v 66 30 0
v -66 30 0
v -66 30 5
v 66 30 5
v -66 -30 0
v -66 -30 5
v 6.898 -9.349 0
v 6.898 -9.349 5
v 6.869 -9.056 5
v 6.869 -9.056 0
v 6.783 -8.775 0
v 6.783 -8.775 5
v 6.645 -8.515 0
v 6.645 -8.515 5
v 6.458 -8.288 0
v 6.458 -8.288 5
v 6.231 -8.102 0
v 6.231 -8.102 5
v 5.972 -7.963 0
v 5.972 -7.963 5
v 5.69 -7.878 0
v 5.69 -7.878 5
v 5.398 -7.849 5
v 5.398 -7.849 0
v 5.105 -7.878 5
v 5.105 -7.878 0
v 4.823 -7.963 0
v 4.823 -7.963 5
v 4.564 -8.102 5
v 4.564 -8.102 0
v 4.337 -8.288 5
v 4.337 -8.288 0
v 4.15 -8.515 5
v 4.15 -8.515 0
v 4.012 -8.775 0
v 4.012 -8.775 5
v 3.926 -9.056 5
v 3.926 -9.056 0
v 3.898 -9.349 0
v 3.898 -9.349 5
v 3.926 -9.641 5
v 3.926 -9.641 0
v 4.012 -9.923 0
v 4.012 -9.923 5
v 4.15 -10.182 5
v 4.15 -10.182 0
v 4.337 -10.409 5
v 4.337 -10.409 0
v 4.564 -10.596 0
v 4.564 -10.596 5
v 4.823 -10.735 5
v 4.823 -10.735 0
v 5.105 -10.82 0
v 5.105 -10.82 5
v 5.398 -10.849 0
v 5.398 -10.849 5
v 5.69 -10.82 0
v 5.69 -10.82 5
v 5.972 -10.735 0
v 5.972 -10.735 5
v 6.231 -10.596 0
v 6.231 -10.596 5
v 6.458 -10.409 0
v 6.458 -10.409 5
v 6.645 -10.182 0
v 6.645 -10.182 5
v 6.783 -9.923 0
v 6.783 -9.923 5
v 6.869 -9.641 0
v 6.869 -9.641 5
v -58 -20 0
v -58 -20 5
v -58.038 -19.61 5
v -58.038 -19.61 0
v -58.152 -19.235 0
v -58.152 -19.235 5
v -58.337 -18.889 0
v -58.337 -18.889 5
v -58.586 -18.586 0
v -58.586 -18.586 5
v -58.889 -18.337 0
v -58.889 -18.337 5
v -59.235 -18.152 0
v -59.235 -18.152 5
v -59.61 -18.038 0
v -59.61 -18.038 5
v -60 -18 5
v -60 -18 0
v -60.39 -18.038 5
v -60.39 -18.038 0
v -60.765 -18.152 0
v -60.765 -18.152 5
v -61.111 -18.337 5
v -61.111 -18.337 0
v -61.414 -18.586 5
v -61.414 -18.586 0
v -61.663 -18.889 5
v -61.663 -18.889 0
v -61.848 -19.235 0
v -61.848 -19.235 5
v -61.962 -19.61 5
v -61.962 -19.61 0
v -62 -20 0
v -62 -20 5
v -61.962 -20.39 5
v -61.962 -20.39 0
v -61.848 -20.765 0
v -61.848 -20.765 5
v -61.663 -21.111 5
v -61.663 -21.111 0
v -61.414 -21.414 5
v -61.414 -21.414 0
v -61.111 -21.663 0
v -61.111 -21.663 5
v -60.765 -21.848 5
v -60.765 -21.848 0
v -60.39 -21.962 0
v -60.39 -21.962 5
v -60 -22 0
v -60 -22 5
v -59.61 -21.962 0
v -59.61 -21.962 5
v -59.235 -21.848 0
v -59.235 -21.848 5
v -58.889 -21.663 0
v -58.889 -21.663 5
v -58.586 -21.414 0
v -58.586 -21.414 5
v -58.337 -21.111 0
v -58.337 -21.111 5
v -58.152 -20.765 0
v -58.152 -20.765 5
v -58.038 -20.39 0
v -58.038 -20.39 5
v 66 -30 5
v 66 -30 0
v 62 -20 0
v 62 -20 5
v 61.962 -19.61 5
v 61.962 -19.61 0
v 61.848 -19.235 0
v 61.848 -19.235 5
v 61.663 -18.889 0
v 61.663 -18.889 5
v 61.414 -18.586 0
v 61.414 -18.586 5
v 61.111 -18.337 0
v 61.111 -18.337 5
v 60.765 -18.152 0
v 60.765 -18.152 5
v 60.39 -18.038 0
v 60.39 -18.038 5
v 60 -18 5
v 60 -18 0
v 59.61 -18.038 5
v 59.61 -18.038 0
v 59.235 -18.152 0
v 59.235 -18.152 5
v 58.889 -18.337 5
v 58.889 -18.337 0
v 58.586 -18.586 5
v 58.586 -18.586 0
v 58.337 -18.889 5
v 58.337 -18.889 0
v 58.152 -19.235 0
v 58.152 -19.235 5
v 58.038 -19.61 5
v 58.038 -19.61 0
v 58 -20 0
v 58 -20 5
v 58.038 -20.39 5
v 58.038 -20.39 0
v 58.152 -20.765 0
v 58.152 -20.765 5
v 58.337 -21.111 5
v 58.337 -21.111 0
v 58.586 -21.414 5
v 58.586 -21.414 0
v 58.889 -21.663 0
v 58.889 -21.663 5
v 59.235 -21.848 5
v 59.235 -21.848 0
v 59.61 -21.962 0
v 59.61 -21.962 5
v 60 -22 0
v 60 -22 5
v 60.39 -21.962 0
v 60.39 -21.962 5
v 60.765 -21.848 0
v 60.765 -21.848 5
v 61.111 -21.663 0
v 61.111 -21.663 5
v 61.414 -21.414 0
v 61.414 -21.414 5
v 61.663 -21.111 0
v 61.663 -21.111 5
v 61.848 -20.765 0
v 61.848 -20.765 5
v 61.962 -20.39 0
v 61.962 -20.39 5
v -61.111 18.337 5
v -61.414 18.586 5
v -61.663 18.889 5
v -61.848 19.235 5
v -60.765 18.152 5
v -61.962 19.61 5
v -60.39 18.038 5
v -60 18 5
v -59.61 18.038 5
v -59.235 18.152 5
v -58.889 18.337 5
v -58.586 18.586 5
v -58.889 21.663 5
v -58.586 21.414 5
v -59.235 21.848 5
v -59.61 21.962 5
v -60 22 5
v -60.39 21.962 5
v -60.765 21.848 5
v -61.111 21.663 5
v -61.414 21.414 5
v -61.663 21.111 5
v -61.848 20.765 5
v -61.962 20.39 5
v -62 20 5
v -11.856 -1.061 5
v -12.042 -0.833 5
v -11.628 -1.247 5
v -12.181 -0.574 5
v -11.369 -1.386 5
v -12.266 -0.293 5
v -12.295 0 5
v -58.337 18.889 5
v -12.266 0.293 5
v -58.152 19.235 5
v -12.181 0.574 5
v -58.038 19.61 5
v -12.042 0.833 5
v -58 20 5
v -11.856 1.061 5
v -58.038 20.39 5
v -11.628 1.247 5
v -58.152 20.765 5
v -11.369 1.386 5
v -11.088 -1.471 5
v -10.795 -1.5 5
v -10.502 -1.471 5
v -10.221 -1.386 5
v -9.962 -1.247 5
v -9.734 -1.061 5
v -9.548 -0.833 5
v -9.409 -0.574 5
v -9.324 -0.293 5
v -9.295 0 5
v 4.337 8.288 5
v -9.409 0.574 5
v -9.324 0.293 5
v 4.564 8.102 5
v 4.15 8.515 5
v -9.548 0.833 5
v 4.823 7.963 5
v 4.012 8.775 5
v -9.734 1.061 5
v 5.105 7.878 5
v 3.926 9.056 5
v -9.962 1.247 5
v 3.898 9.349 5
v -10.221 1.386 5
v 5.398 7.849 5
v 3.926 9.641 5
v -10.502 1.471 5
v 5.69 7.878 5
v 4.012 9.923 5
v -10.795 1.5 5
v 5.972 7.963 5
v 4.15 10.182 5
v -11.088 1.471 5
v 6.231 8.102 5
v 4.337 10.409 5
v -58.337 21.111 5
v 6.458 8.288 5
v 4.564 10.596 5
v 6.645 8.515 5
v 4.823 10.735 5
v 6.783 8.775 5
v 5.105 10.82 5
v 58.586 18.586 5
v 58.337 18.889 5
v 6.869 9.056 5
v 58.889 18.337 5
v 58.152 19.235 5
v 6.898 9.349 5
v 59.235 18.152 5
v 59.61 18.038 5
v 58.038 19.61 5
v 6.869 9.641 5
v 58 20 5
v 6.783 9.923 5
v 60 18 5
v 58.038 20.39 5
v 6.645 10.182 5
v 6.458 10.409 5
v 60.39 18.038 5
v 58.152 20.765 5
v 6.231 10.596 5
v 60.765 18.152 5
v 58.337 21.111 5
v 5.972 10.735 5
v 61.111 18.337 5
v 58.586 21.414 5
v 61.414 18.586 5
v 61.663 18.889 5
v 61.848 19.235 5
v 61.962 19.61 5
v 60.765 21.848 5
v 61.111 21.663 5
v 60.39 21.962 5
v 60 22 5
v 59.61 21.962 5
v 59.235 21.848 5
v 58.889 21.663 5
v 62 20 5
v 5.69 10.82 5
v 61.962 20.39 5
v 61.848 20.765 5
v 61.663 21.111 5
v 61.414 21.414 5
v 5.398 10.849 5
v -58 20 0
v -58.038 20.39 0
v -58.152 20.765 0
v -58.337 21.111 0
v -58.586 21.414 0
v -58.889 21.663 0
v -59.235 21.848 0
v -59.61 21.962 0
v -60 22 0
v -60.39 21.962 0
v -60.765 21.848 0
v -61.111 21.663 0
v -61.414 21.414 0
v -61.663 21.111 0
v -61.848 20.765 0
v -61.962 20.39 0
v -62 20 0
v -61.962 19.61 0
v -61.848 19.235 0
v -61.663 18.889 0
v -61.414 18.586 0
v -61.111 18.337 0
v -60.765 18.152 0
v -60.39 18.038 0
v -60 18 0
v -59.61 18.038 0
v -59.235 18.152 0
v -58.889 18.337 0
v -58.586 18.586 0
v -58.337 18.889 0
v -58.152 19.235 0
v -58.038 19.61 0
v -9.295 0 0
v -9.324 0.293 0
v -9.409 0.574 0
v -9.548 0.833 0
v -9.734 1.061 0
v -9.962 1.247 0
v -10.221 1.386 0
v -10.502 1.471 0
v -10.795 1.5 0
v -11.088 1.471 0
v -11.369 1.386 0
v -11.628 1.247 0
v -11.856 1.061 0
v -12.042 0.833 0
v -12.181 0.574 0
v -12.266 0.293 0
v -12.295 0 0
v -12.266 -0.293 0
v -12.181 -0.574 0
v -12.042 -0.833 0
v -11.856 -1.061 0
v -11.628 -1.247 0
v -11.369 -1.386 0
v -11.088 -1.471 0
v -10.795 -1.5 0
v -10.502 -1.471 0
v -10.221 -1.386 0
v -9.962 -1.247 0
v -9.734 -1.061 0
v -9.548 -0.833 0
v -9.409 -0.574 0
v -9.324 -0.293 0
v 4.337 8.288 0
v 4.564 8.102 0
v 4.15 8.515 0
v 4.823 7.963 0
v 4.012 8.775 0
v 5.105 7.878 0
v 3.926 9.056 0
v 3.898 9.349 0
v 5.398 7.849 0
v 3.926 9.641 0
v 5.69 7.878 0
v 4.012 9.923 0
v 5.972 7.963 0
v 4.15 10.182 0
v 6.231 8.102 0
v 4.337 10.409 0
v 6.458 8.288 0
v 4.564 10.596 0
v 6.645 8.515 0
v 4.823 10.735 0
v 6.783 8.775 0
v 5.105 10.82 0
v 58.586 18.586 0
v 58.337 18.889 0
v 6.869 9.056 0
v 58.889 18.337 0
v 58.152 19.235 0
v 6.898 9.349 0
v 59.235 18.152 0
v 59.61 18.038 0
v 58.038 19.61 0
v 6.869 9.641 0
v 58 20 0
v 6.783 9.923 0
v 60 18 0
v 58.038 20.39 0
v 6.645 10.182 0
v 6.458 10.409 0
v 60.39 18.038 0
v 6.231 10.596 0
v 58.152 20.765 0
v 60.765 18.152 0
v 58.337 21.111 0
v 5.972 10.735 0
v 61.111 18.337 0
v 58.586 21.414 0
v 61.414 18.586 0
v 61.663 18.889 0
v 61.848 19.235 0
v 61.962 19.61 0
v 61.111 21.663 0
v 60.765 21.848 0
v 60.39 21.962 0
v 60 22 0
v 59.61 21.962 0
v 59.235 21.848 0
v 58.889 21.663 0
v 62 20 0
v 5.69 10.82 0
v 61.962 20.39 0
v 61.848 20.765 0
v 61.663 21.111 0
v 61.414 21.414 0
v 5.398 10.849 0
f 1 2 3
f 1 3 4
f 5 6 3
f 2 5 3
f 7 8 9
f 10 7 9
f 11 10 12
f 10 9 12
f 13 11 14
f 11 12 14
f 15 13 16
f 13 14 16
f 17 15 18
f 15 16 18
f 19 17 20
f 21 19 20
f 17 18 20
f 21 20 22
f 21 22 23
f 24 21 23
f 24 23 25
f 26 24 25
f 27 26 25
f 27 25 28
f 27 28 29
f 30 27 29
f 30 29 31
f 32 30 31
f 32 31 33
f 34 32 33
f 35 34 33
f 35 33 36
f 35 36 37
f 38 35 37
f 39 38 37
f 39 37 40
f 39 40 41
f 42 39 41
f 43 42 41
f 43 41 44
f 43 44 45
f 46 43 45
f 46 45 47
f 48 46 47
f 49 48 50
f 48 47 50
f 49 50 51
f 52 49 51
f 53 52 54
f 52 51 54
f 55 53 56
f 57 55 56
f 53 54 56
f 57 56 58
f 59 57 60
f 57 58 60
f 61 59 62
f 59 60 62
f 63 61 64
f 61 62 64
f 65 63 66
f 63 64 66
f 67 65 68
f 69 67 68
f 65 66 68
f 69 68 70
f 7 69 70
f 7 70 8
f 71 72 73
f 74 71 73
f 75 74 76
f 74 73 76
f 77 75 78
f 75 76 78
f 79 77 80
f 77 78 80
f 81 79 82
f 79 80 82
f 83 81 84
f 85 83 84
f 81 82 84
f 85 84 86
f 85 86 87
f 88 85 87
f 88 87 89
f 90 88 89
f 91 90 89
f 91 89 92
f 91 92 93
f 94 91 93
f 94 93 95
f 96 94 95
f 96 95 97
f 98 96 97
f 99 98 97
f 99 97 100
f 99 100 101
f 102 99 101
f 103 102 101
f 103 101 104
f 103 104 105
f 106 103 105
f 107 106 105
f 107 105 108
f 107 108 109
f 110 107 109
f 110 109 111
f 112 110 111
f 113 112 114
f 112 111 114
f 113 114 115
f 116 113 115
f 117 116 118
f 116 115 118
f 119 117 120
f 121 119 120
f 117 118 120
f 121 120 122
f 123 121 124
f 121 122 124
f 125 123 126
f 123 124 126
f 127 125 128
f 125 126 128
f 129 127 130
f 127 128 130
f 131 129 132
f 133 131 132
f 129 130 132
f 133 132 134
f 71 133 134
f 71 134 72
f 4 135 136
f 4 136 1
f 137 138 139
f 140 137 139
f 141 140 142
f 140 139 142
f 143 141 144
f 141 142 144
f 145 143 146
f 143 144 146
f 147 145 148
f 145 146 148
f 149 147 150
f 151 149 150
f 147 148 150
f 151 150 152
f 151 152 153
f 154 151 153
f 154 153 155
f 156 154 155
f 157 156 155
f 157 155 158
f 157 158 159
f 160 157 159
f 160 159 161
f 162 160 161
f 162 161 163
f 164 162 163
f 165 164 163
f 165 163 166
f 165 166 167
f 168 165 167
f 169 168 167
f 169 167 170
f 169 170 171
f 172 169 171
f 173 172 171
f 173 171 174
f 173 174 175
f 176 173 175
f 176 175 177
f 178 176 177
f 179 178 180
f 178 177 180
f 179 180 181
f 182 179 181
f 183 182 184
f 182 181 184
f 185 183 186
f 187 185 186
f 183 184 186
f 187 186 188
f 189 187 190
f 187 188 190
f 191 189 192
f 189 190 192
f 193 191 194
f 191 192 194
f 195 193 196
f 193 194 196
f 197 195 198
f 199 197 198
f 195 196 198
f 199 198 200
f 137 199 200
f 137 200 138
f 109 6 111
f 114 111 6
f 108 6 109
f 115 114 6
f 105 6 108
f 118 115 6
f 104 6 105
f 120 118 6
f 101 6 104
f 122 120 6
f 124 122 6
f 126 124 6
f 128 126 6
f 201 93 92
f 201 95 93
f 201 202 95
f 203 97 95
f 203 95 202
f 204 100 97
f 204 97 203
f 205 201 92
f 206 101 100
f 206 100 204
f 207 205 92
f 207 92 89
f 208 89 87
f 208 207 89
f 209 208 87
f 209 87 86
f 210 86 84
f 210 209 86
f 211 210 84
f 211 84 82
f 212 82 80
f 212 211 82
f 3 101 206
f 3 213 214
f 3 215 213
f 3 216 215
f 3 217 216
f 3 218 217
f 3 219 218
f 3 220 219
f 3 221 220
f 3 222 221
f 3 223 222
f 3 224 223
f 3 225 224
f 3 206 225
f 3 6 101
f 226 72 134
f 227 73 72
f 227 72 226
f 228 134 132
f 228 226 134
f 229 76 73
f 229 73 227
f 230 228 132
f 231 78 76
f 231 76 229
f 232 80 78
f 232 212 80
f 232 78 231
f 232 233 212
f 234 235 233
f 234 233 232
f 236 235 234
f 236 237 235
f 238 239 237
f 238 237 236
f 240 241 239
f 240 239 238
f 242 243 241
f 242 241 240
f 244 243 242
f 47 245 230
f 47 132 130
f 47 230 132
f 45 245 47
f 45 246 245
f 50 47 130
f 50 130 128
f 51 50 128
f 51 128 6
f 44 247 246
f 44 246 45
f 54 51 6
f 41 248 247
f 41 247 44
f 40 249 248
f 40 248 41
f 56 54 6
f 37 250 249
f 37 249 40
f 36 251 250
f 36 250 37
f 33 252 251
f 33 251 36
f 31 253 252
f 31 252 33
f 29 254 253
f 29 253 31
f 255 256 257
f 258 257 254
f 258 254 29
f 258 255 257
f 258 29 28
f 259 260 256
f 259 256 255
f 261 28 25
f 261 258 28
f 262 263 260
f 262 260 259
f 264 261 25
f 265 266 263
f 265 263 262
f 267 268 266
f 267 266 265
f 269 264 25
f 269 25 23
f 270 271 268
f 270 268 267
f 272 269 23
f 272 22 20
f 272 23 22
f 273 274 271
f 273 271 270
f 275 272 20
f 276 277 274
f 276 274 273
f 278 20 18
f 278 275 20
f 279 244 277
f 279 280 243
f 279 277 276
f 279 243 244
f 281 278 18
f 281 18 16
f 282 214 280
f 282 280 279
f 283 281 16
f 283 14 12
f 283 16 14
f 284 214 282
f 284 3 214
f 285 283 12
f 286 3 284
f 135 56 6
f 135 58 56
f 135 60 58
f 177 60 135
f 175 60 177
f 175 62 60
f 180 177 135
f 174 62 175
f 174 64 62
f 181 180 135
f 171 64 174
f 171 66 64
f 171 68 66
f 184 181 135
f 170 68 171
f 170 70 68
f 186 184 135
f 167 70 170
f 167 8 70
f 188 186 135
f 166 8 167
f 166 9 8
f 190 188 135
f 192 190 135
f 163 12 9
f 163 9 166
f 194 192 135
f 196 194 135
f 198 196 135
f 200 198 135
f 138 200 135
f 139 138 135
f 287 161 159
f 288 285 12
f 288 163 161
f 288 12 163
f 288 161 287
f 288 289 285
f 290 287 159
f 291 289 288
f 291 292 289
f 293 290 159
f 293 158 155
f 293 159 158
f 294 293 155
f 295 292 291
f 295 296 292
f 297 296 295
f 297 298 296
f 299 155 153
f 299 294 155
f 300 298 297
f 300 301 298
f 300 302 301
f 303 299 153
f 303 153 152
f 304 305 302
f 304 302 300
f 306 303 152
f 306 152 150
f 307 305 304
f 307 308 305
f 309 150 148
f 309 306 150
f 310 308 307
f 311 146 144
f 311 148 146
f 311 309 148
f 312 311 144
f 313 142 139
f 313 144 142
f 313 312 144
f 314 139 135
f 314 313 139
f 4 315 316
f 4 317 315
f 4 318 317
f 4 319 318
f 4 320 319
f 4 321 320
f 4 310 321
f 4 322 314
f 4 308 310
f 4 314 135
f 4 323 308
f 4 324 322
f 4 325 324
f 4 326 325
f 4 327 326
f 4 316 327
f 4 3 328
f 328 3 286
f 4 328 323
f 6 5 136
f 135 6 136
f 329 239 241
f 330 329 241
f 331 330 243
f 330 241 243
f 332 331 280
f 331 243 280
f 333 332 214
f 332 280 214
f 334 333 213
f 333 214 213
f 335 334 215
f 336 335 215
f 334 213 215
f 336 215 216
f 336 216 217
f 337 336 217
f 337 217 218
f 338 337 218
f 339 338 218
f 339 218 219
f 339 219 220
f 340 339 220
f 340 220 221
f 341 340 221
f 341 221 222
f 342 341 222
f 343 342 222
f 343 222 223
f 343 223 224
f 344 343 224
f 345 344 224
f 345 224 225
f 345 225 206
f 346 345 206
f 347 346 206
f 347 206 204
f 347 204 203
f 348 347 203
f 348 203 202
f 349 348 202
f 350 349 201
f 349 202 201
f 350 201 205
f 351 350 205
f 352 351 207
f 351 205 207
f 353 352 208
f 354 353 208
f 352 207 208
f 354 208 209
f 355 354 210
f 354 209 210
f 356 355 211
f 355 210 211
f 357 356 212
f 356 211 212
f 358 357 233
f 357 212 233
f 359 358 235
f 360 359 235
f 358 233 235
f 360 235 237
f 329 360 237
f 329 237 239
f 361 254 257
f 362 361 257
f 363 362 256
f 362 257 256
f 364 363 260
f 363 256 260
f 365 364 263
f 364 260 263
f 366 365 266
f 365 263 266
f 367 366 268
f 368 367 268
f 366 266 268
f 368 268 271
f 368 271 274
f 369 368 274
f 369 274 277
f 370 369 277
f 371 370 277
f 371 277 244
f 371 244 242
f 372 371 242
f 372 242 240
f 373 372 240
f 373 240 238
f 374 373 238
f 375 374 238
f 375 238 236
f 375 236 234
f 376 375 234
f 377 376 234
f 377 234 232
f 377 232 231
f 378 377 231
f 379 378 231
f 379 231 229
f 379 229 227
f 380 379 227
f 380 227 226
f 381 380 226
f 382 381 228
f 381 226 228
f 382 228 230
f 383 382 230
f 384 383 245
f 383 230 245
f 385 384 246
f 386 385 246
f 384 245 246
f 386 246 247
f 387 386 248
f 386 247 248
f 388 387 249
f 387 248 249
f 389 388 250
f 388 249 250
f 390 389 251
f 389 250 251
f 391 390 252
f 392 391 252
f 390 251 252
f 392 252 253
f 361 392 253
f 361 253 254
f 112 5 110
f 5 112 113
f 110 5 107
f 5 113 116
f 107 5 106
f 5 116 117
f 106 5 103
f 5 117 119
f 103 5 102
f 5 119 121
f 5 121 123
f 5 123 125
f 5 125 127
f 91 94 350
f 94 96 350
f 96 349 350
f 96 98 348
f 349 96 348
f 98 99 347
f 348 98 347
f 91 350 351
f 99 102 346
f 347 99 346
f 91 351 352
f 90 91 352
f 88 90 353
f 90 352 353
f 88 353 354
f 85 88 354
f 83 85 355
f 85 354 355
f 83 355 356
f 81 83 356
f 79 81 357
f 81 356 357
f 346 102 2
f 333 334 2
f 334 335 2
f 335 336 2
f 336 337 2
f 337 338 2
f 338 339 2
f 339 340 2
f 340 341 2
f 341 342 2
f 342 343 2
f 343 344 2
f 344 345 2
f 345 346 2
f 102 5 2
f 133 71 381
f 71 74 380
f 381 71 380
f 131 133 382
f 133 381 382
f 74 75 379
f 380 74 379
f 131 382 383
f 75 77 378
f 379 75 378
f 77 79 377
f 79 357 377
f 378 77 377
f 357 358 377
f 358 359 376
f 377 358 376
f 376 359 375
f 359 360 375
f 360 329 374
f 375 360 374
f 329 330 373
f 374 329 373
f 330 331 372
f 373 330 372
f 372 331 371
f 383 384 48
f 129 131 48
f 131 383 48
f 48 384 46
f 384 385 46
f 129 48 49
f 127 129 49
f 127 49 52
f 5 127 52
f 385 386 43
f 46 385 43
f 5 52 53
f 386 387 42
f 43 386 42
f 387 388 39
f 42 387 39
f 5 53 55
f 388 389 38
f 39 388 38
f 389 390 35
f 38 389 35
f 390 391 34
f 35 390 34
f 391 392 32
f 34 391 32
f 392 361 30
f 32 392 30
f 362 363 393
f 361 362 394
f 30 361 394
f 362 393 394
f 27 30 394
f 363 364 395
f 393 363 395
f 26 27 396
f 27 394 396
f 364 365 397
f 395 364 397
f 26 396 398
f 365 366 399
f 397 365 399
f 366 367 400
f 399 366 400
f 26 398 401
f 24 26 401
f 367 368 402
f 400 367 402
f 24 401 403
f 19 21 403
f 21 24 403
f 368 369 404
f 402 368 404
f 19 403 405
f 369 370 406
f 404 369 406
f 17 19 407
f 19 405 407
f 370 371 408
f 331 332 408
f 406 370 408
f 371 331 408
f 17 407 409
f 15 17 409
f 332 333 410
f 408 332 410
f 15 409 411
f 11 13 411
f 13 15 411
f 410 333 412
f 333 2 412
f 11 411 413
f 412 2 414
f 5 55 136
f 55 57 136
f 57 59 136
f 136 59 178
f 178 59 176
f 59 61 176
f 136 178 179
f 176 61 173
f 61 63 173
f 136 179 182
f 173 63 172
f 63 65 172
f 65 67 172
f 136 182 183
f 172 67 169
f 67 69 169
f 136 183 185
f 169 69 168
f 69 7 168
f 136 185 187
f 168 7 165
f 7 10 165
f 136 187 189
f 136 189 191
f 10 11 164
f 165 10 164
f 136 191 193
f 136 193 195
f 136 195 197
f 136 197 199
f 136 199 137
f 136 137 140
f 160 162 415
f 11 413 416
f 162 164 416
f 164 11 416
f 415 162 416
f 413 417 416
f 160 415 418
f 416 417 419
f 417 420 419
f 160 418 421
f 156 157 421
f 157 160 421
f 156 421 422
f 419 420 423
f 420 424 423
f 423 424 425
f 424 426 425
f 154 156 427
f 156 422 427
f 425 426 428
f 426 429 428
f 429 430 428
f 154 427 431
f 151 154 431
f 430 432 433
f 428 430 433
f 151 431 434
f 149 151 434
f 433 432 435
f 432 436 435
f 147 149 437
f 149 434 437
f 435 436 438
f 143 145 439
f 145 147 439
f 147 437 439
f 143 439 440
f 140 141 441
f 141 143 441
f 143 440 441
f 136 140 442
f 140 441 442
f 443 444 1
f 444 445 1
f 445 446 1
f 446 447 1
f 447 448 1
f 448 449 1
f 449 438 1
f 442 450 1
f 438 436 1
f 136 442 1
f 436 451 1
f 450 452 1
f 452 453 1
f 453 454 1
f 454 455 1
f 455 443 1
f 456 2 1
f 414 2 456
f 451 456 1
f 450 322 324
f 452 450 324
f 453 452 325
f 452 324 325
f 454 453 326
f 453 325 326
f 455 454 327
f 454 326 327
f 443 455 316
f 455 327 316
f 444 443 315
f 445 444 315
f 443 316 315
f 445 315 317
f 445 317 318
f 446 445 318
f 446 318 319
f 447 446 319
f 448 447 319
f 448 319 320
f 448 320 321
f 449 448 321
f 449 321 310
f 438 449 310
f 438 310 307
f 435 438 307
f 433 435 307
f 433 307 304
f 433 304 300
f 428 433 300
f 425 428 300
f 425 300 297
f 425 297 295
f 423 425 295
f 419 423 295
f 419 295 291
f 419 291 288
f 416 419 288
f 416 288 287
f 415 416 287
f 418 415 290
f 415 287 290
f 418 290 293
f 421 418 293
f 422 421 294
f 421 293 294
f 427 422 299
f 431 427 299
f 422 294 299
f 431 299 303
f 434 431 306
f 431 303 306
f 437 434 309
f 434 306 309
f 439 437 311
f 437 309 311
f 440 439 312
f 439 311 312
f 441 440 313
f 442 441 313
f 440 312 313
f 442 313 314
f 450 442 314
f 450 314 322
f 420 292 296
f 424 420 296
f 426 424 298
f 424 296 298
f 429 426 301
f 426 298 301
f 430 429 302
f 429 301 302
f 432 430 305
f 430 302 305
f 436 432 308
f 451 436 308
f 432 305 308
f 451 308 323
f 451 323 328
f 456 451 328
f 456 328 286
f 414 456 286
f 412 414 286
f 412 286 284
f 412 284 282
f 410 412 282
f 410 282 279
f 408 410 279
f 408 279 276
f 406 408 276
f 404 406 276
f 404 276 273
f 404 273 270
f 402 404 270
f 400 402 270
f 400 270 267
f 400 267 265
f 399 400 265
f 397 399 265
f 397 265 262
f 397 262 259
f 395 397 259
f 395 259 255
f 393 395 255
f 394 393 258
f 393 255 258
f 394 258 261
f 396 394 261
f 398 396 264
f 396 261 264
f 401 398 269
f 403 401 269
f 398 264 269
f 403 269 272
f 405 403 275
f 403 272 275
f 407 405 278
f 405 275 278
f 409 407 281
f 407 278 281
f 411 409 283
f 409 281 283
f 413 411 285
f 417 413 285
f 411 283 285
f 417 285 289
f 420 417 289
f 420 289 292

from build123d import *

# Parameters (mm, degrees)
SKETCH1_W           = 140
SKETCH1_H           = 60
BOSS_EXTRUDE1_DEPTH = 5
CUT_EXTRUDE1_REACH  = 7
SKETCH2_R           = 2
SKETCH3_W           = 4
SKETCH3_H           = 60
CUT_EXTRUDE2_DEPTH  = 6
CUT_EXTRUDE3_REACH  = 7
SKETCH4_R           = 1.5


with BuildPart() as part:
    # Sketch1 → Boss-Extrude1 (new body)
    with BuildSketch(Plane.XY):
        Rectangle(SKETCH1_W, SKETCH1_H)
    extrude(amount=BOSS_EXTRUDE1_DEPTH)

    # Sketch2 → Cut-Extrude1 (cut, up to next)
    with BuildSketch(Plane.XY.offset(5), mode=Mode.PRIVATE) as cut_extrude1_sk1:
        with Locations((-60, 20)):
            Circle(SKETCH2_R)
    cut_extrude1_tool1 = extrude(cut_extrude1_sk1.sketch, amount=-CUT_EXTRUDE1_REACH, mode=Mode.PRIVATE) & part.part
    add(cut_extrude1_tool1.solids().sort_by_distance((-60, 20, 5))[0], mode=Mode.SUBTRACT)
    # Sketch2 → Cut-Extrude1 (cut, up to next)
    with BuildSketch(Plane.XY.offset(5), mode=Mode.PRIVATE) as cut_extrude1_sk2:
        with Locations((60, 20)):
            Circle(SKETCH2_R)
    cut_extrude1_tool2 = extrude(cut_extrude1_sk2.sketch, amount=-CUT_EXTRUDE1_REACH, mode=Mode.PRIVATE) & part.part
    add(cut_extrude1_tool2.solids().sort_by_distance((60, 20, 5))[0], mode=Mode.SUBTRACT)
    # Sketch2 → Cut-Extrude1 (cut, up to next)
    with BuildSketch(Plane.XY.offset(5), mode=Mode.PRIVATE) as cut_extrude1_sk3:
        with Locations((60, -20)):
            Circle(SKETCH2_R)
    cut_extrude1_tool3 = extrude(cut_extrude1_sk3.sketch, amount=-CUT_EXTRUDE1_REACH, mode=Mode.PRIVATE) & part.part
    add(cut_extrude1_tool3.solids().sort_by_distance((60, -20, 5))[0], mode=Mode.SUBTRACT)
    # Sketch2 → Cut-Extrude1 (cut, up to next)
    with BuildSketch(Plane.XY.offset(5), mode=Mode.PRIVATE) as cut_extrude1_sk4:
        with Locations((-60, -20)):
            Circle(SKETCH2_R)
    cut_extrude1_tool4 = extrude(cut_extrude1_sk4.sketch, amount=-CUT_EXTRUDE1_REACH, mode=Mode.PRIVATE) & part.part
    add(cut_extrude1_tool4.solids().sort_by_distance((-60, -20, 5))[0], mode=Mode.SUBTRACT)

    # Sketch3 → Cut-Extrude2 (cut, through all)
    with BuildSketch(Plane.XY.offset(5)):
        with Locations((-68, 0)):
            Rectangle(SKETCH3_W, SKETCH3_H)
        with Locations((68, 0)):
            Rectangle(SKETCH3_W, SKETCH3_H)
    extrude(amount=-CUT_EXTRUDE2_DEPTH, mode=Mode.SUBTRACT)

    # Sketch4 → Cut-Extrude3 (cut, up to next)
    with BuildSketch(Plane.XY.offset(5), mode=Mode.PRIVATE) as cut_extrude3_sk1:
        with Locations((5.3975, 9.348744234)):
            Circle(SKETCH4_R)
    cut_extrude3_tool1 = extrude(cut_extrude3_sk1.sketch, amount=-CUT_EXTRUDE3_REACH, mode=Mode.PRIVATE) & part.part
    add(cut_extrude3_tool1.solids().sort_by_distance((5.3975, 9.348744, 5))[0], mode=Mode.SUBTRACT)
    # Sketch4 → Cut-Extrude3 (cut, up to next)
    with BuildSketch(Plane.XY.offset(5), mode=Mode.PRIVATE) as cut_extrude3_sk2:
        with Locations((5.3975, -9.348744234)):
            Circle(SKETCH4_R)
    cut_extrude3_tool2 = extrude(cut_extrude3_sk2.sketch, amount=-CUT_EXTRUDE3_REACH, mode=Mode.PRIVATE) & part.part
    add(cut_extrude3_tool2.solids().sort_by_distance((5.3975, -9.348744, 5))[0], mode=Mode.SUBTRACT)
    # Sketch4 → Cut-Extrude3 (cut, up to next)
    with BuildSketch(Plane.XY.offset(5), mode=Mode.PRIVATE) as cut_extrude3_sk3:
        with Locations((-10.795, 0)):
            Circle(SKETCH4_R)
    cut_extrude3_tool3 = extrude(cut_extrude3_sk3.sketch, amount=-CUT_EXTRUDE3_REACH, mode=Mode.PRIVATE) & part.part
    add(cut_extrude3_tool3.solids().sort_by_distance((-10.795, 0, 5))[0], mode=Mode.SUBTRACT)


solid = part.part
